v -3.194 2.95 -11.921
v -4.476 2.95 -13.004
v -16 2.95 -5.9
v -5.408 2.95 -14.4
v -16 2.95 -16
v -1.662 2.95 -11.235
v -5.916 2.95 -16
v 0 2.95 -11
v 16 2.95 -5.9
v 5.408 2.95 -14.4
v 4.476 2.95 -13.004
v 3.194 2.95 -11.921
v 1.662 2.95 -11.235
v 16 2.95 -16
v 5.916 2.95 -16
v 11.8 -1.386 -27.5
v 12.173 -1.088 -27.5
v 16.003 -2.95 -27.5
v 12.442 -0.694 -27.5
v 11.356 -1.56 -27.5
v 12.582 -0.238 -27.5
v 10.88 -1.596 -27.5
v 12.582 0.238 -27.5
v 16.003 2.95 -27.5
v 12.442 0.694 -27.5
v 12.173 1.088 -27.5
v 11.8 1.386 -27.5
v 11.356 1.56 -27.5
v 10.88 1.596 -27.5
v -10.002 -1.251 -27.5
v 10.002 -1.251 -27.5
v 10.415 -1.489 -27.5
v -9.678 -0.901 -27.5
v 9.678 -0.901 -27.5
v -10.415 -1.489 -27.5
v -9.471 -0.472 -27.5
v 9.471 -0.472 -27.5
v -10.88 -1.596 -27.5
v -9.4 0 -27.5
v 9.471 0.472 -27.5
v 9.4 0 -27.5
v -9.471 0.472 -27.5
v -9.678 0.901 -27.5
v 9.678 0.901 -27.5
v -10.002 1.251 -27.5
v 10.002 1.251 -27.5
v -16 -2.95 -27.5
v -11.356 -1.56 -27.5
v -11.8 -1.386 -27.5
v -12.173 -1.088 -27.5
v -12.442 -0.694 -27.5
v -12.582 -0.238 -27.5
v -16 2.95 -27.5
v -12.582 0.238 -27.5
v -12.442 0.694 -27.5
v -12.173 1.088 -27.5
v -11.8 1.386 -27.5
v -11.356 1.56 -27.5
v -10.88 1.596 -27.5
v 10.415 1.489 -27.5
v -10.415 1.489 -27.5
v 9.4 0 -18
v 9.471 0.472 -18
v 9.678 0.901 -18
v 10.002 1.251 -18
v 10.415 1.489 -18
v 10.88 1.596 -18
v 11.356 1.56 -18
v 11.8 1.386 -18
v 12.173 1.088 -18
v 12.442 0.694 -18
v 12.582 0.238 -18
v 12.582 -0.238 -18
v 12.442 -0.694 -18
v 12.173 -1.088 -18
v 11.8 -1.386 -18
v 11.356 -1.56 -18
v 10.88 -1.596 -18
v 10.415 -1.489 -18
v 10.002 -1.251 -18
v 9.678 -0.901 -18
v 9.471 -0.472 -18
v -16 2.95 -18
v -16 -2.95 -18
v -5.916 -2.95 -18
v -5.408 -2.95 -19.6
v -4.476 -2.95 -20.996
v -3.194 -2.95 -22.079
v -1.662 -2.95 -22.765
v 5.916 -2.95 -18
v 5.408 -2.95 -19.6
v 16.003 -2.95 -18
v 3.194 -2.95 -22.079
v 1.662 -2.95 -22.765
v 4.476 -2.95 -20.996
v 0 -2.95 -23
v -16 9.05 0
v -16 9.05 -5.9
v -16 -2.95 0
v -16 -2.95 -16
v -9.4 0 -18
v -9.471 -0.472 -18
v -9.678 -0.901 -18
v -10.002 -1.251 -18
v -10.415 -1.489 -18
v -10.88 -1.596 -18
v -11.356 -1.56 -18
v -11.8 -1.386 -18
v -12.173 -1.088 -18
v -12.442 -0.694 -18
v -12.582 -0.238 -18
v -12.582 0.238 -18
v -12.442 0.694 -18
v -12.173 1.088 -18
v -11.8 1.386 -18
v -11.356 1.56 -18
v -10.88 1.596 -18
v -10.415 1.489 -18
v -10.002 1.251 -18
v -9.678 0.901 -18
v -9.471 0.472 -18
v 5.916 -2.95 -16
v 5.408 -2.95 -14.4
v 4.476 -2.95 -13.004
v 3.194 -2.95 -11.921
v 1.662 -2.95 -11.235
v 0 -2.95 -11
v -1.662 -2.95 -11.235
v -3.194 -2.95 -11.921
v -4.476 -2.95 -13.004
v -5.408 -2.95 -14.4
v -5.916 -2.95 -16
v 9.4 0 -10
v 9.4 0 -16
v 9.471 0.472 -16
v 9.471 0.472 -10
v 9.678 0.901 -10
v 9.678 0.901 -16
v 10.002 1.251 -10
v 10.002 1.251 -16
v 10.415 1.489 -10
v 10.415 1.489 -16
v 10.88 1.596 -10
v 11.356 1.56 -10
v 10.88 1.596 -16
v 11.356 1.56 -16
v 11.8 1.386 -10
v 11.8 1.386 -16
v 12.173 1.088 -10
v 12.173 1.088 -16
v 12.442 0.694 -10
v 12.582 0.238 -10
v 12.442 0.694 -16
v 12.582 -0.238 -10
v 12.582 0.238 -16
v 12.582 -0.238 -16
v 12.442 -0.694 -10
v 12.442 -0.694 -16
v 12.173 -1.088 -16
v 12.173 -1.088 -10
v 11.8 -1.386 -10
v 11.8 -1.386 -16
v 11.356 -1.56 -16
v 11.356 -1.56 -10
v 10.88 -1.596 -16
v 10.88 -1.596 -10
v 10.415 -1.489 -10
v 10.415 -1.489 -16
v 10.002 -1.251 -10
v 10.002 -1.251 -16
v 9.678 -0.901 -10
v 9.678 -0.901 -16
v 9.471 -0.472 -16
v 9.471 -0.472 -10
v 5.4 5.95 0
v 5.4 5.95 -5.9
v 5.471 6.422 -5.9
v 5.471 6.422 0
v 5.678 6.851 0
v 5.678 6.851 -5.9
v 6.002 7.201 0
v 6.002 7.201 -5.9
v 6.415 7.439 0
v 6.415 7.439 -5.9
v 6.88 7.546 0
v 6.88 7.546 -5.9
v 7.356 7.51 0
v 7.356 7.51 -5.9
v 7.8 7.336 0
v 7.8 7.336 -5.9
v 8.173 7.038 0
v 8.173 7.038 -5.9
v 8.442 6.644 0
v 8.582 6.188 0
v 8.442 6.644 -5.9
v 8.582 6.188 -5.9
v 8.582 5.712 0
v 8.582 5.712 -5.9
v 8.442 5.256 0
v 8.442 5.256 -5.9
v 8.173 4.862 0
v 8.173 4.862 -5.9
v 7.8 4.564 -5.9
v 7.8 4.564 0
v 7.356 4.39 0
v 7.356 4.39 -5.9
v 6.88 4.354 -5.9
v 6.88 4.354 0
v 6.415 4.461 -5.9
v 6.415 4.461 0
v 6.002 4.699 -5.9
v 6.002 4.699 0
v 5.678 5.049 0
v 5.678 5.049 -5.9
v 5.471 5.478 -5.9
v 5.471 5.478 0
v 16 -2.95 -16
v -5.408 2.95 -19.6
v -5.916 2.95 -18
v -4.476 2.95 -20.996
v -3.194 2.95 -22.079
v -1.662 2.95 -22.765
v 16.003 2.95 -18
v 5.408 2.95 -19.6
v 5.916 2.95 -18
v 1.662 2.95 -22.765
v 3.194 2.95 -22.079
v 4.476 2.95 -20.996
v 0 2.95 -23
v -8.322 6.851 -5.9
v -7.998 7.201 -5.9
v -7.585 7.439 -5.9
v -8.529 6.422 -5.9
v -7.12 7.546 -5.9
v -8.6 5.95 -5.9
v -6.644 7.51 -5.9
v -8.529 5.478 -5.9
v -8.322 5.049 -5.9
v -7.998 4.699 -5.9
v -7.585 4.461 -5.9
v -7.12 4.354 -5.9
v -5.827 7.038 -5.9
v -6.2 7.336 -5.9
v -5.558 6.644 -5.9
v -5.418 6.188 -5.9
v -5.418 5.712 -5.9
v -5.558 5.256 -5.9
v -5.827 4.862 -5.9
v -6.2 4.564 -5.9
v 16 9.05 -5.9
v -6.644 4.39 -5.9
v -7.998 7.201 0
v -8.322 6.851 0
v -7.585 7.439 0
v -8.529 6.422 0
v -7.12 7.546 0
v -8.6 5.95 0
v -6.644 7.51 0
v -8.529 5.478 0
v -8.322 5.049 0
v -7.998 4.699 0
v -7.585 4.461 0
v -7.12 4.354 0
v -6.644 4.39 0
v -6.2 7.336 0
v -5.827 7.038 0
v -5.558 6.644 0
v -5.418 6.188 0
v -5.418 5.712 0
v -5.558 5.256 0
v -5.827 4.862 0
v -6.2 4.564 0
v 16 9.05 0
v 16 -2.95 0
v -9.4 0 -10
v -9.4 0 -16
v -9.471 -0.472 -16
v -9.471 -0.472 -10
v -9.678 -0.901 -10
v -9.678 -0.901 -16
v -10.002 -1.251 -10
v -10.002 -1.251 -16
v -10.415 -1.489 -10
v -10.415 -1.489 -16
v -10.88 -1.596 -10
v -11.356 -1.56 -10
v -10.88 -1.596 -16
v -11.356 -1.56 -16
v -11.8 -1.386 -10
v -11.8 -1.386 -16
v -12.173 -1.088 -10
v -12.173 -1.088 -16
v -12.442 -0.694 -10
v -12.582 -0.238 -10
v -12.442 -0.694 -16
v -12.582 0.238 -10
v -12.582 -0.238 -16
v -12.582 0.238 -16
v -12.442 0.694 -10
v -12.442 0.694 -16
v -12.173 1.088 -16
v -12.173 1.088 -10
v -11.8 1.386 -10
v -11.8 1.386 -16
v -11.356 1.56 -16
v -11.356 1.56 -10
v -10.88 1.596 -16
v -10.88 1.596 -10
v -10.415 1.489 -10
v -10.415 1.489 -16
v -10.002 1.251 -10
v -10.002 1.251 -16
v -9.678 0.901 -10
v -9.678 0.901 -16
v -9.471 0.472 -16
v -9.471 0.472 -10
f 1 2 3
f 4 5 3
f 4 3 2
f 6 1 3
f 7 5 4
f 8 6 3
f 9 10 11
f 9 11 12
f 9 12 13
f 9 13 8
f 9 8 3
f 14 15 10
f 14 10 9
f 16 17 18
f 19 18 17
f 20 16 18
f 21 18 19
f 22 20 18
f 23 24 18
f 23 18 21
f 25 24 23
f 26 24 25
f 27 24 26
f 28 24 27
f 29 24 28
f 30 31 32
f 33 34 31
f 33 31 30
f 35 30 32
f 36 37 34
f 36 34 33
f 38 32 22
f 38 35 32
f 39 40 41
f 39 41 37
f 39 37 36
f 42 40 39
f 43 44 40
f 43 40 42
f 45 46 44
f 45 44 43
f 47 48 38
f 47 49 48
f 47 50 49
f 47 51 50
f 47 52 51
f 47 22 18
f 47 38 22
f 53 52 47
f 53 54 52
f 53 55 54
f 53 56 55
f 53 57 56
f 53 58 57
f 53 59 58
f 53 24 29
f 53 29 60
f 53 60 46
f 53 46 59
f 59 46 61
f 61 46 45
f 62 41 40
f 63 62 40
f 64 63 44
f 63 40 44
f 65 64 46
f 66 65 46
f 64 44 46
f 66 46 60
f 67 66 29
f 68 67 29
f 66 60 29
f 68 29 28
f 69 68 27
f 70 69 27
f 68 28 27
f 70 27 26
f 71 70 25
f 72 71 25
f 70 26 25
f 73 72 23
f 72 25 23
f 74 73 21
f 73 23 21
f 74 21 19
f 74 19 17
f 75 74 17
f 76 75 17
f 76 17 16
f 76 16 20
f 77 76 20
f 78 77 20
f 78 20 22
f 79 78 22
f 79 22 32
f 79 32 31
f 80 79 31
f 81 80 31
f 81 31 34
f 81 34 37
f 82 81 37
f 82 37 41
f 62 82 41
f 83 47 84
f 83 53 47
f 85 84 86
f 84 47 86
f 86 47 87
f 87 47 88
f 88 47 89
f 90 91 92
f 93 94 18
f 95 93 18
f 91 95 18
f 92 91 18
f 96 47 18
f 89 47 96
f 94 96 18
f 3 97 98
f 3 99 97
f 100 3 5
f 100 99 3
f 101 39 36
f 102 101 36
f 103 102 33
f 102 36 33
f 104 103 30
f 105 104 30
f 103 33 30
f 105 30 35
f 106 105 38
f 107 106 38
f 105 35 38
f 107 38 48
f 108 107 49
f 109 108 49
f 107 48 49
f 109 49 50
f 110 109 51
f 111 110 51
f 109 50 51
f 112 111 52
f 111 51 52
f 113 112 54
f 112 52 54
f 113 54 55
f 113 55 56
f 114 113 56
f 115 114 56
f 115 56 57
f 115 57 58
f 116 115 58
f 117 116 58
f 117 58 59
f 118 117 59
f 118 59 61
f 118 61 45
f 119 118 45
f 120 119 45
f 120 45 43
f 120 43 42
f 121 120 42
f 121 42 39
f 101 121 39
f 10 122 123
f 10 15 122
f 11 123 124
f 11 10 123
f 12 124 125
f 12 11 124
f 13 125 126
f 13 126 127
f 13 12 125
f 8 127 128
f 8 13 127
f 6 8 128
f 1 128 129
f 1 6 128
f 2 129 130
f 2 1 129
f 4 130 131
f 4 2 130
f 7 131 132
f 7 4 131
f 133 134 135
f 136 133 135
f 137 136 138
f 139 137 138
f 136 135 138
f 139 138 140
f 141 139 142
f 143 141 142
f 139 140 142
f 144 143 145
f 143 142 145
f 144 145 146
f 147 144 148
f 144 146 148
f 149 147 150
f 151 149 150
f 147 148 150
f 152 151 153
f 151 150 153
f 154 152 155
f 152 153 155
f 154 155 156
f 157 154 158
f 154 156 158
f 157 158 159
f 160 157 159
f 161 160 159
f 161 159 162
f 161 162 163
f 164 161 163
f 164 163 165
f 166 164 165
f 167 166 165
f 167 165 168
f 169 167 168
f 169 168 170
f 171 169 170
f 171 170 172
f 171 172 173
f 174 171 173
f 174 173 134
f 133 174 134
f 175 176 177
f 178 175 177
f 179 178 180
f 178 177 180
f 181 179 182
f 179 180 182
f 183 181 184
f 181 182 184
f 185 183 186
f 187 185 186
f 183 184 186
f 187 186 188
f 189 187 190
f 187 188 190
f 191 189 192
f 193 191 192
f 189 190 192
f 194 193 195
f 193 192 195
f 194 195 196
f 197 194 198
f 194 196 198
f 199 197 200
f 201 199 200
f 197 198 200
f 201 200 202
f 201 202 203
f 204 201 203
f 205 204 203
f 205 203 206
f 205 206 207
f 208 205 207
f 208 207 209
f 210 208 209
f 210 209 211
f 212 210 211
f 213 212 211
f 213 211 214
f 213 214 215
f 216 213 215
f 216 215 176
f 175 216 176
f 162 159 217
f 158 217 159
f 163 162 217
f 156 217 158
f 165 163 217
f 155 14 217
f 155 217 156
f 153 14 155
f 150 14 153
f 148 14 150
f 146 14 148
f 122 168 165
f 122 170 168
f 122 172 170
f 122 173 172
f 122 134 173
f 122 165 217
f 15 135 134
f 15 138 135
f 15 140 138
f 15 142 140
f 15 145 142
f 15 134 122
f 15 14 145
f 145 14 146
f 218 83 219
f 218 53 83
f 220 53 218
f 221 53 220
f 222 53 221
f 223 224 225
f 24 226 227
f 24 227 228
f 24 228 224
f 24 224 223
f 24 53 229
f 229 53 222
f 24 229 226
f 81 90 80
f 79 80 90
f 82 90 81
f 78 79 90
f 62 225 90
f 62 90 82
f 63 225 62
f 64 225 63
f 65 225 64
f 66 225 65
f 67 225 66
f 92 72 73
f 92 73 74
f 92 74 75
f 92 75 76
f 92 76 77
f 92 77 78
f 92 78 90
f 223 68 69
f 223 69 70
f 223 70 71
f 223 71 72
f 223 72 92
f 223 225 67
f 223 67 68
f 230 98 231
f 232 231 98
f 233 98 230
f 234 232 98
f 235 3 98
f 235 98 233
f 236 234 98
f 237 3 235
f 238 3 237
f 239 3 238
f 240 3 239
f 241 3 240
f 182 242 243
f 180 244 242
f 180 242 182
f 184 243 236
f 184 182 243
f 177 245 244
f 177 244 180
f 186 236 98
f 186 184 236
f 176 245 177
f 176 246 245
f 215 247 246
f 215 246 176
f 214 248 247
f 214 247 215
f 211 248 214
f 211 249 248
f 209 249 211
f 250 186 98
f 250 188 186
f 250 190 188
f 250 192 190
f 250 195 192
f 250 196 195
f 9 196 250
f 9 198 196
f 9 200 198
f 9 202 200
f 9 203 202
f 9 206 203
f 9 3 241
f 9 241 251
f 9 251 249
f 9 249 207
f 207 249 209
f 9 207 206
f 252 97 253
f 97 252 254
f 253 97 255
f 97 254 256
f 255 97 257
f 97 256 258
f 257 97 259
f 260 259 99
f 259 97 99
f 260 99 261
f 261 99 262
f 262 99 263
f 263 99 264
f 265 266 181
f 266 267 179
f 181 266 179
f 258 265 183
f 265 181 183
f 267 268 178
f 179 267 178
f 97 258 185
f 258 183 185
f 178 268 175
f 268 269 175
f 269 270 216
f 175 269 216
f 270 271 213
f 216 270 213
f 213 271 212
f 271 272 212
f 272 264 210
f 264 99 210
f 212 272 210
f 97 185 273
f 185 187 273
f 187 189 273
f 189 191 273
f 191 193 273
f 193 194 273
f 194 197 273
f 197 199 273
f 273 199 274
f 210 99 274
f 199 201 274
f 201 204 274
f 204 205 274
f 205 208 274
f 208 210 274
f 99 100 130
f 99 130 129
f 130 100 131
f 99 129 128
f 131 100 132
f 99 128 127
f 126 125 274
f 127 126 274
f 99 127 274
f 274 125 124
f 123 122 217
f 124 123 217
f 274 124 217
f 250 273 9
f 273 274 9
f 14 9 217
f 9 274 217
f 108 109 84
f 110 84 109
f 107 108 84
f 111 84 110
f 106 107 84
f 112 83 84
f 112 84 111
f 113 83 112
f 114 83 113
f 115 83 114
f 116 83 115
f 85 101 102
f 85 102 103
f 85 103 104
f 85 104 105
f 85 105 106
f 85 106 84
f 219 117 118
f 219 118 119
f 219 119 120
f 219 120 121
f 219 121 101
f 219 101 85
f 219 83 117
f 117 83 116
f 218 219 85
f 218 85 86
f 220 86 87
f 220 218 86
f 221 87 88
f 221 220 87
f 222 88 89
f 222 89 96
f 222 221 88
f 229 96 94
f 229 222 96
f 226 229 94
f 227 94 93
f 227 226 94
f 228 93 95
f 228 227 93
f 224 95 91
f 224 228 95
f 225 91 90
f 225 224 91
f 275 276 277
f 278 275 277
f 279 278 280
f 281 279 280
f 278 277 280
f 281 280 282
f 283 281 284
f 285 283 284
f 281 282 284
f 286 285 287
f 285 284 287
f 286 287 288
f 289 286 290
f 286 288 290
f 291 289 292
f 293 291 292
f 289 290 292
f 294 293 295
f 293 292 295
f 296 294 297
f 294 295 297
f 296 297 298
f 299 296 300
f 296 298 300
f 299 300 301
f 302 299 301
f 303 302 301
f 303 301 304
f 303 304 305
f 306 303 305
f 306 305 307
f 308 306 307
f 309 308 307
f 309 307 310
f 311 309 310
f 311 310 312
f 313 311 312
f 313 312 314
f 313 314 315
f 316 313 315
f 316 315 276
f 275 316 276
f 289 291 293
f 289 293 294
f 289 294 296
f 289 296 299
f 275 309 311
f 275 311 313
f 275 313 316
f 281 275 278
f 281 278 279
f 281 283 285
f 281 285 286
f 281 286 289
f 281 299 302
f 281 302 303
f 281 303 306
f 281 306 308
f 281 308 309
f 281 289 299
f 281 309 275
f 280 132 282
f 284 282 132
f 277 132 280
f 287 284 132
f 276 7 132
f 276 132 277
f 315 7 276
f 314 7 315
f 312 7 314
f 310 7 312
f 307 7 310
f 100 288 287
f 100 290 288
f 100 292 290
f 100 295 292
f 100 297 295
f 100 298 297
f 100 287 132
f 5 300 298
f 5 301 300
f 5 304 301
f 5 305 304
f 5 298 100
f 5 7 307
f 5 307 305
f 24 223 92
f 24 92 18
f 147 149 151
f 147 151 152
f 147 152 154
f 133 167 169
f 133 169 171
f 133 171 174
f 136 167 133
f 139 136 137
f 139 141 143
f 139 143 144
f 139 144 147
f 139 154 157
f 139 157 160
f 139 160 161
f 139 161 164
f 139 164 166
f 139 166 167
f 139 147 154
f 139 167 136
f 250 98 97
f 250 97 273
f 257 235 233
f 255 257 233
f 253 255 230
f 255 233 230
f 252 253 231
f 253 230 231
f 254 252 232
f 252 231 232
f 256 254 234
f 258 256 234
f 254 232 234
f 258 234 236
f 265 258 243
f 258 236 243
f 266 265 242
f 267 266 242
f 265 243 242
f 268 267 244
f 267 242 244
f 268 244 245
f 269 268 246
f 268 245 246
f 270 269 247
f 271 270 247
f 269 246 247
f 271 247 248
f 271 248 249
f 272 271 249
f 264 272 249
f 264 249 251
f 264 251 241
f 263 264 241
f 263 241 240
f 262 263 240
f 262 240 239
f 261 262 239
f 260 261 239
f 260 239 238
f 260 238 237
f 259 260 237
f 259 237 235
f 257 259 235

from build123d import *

# Parameters (mm, degrees)
EXTRUDE_1_DEPTH     = 2.95
EXTRUDE_1_2_DEPTH   = 2.95
SKETCH_3_R          = 1.6
CUT_EXTRUDE_1_DEPTH = 17.5
SKETCH_4_W          = 32
SKETCH_4_H          = 5.9
EXTRUDE_2_DEPTH     = 6.1
SKETCH_5_R          = 1.6
CUT_EXTRUDE_2_DEPTH = 6.1


with BuildPart() as part:
    # 草图1 → 凸台-拉伸1 (new, symmetric)
    with BuildSketch(Plane(origin=(0, 0, 0), x_dir=(1, 0, 0), z_dir=(0, 1, 0))):
        with BuildLine():
            Line((-16, 16), (-16, 0))
            Line((-16, 0), (16, 0))
            Line((16, 0), (16, 16))
            Line((16, 16), (5.916079783, 16))
            ThreePointArc((5.916079783, 16), (0, 11), (-5.916079783, 16))
            Line((-5.916079783, 16), (-16, 16))
        make_face()
    extrude(amount=EXTRUDE_1_DEPTH, both=True)


with BuildPart() as body_2:
    # 草图1 → Extrude 1 2 (new, symmetric)
    with BuildSketch(Plane(origin=(0, 0, 0), x_dir=(1, 0, 0), z_dir=(0, 1, 0))):
        with BuildLine():
            Line((-16, 18), (-5.916079783, 18))
            ThreePointArc((-5.916079783, 18), (0, 23), (5.916079783, 18))
            Line((5.916079783, 18), (16.002629356, 18))
            Line((16.002629356, 18), (16.002629356, 27.5))
            Line((16.002629356, 27.5), (-16, 27.5))
            Line((-16, 27.5), (-16, 18))
        make_face()
    extrude(amount=EXTRUDE_1_2_DEPTH, both=True)


with BuildPart() as cut_extrude_1_tool:
    # 草图3 → 切除-拉伸1 (new body)
    with BuildSketch(Plane(origin=(0, 0, -27.5), x_dir=(-1, 0, 0), z_dir=(0, 0, -1))):
        with Locations((-11, 0)):
            Circle(SKETCH_3_R)
        with Locations(Location((11, 0, 0), (0, 0, 180))):
            Circle(SKETCH_3_R)
    extrude(amount=-CUT_EXTRUDE_1_DEPTH)


with BuildPart() as part_1:
    add(part.part)

    # 切除-拉伸1: cut by cut_extrude_1_tool
    add(cut_extrude_1_tool.part, mode=Mode.SUBTRACT)

    # 草图4 → 凸台-拉伸2 (add)
    with BuildSketch(Plane(origin=(0, 2.95, 0), x_dir=(1, 0, 0), z_dir=(0, 1, 0))):
        with Locations((0, 2.95)):
            Rectangle(SKETCH_4_W, SKETCH_4_H)
    extrude(amount=EXTRUDE_2_DEPTH)

    # 草图5 → 切除-拉伸2 (cut)
    with BuildSketch(Plane(origin=(0, 0, -5.9), x_dir=(-1, 0, 0), z_dir=(0, 0, -1))):
        with Locations((-7, 5.95)):
            Circle(SKETCH_5_R)
        with Locations((7, 5.95)):
            Circle(SKETCH_5_R)
    extrude(amount=-CUT_EXTRUDE_2_DEPTH, mode=Mode.SUBTRACT)


with BuildPart() as body_2_1:
    add(body_2.part)

    # 切除-拉伸1: cut by cut_extrude_1_tool
    add(cut_extrude_1_tool.part, mode=Mode.SUBTRACT)


solid = Compound([part_1.part, body_2_1.part])
